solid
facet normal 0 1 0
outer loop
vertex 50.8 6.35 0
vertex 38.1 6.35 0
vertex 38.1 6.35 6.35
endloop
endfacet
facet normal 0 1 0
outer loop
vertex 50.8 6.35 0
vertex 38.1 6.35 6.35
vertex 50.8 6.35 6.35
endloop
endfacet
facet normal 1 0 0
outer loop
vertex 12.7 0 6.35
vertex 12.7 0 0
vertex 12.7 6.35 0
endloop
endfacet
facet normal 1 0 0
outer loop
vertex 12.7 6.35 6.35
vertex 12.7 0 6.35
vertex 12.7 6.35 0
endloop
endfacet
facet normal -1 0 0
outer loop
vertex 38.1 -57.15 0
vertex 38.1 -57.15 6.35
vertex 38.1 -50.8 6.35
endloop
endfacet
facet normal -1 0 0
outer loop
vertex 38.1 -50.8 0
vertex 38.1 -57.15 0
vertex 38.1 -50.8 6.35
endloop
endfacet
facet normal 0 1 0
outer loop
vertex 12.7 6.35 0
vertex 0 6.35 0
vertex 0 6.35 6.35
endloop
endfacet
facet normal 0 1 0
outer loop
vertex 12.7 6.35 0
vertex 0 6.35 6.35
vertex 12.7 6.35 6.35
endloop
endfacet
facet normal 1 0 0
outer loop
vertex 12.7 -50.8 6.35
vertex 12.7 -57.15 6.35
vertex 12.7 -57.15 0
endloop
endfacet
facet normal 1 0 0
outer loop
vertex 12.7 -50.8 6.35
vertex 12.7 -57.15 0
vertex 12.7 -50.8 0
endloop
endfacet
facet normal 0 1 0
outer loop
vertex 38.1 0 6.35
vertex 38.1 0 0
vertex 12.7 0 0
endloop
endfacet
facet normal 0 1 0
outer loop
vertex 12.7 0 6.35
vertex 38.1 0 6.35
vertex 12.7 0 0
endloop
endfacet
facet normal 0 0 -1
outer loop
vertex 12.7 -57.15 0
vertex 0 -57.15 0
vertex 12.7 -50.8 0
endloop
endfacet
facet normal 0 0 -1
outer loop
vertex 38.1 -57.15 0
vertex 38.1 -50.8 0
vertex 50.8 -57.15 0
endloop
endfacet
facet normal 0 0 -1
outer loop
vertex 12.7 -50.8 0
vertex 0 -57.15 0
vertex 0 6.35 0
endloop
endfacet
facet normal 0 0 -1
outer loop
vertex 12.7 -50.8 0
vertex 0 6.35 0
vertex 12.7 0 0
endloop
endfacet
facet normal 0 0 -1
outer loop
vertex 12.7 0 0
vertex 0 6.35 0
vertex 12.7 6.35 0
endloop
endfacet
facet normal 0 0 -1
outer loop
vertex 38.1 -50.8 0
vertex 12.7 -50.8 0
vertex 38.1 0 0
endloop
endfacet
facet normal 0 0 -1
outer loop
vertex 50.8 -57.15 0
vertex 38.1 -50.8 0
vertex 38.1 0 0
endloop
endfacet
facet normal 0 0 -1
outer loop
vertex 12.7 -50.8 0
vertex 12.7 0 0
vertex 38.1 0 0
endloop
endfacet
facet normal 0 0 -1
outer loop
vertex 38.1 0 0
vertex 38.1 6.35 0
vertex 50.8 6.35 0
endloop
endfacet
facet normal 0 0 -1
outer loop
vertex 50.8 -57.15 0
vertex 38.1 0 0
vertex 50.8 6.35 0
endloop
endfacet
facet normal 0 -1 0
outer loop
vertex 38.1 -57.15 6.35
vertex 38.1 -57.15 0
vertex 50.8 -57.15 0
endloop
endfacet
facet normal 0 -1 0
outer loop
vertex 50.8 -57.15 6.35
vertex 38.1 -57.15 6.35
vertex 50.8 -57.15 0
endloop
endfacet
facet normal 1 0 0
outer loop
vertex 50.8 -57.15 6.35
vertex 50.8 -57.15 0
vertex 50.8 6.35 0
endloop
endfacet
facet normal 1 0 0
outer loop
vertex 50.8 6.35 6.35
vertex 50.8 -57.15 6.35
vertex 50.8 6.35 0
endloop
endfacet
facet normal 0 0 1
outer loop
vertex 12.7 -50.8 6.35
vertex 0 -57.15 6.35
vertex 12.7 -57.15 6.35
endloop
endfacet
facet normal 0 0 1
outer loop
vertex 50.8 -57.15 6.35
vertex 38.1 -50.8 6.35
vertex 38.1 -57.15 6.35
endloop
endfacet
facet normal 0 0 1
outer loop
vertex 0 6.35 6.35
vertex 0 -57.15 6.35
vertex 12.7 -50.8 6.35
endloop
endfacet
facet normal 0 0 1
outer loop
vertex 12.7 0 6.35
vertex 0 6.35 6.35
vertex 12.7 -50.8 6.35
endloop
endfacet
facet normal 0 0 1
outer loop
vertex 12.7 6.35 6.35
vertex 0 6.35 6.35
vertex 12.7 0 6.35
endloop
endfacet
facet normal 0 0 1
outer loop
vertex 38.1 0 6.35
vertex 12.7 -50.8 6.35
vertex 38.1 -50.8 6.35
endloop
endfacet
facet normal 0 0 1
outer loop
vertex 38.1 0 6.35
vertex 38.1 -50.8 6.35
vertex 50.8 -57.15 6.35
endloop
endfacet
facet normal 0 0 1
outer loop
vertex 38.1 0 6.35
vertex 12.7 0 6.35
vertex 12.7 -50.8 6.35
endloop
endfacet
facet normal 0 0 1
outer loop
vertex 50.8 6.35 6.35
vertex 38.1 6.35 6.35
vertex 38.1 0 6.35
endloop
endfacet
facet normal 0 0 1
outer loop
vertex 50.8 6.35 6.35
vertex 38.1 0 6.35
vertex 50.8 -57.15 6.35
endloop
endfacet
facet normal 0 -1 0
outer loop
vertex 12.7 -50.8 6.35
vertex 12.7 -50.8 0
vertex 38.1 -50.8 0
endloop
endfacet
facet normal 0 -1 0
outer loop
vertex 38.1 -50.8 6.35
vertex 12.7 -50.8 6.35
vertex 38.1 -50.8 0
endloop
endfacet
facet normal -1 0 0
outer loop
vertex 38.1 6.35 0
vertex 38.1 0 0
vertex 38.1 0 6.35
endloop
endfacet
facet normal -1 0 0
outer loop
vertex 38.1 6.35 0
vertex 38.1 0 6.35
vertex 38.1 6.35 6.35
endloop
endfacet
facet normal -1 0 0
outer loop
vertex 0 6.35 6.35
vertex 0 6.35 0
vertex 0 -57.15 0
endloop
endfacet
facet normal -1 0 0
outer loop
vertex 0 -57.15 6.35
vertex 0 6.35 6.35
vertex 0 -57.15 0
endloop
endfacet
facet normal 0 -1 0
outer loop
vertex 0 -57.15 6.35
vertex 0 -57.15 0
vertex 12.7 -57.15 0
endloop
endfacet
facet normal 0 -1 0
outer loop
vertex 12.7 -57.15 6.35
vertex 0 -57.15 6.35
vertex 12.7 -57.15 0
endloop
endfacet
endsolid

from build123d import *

# Parameters (mm, degrees)
F0_W     = 12.7
F0_H     = 6.35
F1_DEPTH = 6.35


with BuildPart() as f1:
    # F0 (on Top) → F1 (new body)
    with BuildSketch(Plane.XY):
        Polygon((12.7, 0), (0, 0), (0, -50.8), (12.7, -50.8), (38.1, -50.8), (50.8, -50.8), (50.8, 0), (38.1, 0), align=None)
        with Locations((6.35, -53.975)):
            Rectangle(F0_W, F0_H)
        with Locations((44.45, -53.975)):
            Rectangle(F0_W, F0_H)
        with Locations((6.35, 3.175)):
            Rectangle(F0_W, F0_H)
        with Locations((44.45, 3.175)):
            Rectangle(F0_W, F0_H)
    extrude(amount=F1_DEPTH)


solid = f1.part
